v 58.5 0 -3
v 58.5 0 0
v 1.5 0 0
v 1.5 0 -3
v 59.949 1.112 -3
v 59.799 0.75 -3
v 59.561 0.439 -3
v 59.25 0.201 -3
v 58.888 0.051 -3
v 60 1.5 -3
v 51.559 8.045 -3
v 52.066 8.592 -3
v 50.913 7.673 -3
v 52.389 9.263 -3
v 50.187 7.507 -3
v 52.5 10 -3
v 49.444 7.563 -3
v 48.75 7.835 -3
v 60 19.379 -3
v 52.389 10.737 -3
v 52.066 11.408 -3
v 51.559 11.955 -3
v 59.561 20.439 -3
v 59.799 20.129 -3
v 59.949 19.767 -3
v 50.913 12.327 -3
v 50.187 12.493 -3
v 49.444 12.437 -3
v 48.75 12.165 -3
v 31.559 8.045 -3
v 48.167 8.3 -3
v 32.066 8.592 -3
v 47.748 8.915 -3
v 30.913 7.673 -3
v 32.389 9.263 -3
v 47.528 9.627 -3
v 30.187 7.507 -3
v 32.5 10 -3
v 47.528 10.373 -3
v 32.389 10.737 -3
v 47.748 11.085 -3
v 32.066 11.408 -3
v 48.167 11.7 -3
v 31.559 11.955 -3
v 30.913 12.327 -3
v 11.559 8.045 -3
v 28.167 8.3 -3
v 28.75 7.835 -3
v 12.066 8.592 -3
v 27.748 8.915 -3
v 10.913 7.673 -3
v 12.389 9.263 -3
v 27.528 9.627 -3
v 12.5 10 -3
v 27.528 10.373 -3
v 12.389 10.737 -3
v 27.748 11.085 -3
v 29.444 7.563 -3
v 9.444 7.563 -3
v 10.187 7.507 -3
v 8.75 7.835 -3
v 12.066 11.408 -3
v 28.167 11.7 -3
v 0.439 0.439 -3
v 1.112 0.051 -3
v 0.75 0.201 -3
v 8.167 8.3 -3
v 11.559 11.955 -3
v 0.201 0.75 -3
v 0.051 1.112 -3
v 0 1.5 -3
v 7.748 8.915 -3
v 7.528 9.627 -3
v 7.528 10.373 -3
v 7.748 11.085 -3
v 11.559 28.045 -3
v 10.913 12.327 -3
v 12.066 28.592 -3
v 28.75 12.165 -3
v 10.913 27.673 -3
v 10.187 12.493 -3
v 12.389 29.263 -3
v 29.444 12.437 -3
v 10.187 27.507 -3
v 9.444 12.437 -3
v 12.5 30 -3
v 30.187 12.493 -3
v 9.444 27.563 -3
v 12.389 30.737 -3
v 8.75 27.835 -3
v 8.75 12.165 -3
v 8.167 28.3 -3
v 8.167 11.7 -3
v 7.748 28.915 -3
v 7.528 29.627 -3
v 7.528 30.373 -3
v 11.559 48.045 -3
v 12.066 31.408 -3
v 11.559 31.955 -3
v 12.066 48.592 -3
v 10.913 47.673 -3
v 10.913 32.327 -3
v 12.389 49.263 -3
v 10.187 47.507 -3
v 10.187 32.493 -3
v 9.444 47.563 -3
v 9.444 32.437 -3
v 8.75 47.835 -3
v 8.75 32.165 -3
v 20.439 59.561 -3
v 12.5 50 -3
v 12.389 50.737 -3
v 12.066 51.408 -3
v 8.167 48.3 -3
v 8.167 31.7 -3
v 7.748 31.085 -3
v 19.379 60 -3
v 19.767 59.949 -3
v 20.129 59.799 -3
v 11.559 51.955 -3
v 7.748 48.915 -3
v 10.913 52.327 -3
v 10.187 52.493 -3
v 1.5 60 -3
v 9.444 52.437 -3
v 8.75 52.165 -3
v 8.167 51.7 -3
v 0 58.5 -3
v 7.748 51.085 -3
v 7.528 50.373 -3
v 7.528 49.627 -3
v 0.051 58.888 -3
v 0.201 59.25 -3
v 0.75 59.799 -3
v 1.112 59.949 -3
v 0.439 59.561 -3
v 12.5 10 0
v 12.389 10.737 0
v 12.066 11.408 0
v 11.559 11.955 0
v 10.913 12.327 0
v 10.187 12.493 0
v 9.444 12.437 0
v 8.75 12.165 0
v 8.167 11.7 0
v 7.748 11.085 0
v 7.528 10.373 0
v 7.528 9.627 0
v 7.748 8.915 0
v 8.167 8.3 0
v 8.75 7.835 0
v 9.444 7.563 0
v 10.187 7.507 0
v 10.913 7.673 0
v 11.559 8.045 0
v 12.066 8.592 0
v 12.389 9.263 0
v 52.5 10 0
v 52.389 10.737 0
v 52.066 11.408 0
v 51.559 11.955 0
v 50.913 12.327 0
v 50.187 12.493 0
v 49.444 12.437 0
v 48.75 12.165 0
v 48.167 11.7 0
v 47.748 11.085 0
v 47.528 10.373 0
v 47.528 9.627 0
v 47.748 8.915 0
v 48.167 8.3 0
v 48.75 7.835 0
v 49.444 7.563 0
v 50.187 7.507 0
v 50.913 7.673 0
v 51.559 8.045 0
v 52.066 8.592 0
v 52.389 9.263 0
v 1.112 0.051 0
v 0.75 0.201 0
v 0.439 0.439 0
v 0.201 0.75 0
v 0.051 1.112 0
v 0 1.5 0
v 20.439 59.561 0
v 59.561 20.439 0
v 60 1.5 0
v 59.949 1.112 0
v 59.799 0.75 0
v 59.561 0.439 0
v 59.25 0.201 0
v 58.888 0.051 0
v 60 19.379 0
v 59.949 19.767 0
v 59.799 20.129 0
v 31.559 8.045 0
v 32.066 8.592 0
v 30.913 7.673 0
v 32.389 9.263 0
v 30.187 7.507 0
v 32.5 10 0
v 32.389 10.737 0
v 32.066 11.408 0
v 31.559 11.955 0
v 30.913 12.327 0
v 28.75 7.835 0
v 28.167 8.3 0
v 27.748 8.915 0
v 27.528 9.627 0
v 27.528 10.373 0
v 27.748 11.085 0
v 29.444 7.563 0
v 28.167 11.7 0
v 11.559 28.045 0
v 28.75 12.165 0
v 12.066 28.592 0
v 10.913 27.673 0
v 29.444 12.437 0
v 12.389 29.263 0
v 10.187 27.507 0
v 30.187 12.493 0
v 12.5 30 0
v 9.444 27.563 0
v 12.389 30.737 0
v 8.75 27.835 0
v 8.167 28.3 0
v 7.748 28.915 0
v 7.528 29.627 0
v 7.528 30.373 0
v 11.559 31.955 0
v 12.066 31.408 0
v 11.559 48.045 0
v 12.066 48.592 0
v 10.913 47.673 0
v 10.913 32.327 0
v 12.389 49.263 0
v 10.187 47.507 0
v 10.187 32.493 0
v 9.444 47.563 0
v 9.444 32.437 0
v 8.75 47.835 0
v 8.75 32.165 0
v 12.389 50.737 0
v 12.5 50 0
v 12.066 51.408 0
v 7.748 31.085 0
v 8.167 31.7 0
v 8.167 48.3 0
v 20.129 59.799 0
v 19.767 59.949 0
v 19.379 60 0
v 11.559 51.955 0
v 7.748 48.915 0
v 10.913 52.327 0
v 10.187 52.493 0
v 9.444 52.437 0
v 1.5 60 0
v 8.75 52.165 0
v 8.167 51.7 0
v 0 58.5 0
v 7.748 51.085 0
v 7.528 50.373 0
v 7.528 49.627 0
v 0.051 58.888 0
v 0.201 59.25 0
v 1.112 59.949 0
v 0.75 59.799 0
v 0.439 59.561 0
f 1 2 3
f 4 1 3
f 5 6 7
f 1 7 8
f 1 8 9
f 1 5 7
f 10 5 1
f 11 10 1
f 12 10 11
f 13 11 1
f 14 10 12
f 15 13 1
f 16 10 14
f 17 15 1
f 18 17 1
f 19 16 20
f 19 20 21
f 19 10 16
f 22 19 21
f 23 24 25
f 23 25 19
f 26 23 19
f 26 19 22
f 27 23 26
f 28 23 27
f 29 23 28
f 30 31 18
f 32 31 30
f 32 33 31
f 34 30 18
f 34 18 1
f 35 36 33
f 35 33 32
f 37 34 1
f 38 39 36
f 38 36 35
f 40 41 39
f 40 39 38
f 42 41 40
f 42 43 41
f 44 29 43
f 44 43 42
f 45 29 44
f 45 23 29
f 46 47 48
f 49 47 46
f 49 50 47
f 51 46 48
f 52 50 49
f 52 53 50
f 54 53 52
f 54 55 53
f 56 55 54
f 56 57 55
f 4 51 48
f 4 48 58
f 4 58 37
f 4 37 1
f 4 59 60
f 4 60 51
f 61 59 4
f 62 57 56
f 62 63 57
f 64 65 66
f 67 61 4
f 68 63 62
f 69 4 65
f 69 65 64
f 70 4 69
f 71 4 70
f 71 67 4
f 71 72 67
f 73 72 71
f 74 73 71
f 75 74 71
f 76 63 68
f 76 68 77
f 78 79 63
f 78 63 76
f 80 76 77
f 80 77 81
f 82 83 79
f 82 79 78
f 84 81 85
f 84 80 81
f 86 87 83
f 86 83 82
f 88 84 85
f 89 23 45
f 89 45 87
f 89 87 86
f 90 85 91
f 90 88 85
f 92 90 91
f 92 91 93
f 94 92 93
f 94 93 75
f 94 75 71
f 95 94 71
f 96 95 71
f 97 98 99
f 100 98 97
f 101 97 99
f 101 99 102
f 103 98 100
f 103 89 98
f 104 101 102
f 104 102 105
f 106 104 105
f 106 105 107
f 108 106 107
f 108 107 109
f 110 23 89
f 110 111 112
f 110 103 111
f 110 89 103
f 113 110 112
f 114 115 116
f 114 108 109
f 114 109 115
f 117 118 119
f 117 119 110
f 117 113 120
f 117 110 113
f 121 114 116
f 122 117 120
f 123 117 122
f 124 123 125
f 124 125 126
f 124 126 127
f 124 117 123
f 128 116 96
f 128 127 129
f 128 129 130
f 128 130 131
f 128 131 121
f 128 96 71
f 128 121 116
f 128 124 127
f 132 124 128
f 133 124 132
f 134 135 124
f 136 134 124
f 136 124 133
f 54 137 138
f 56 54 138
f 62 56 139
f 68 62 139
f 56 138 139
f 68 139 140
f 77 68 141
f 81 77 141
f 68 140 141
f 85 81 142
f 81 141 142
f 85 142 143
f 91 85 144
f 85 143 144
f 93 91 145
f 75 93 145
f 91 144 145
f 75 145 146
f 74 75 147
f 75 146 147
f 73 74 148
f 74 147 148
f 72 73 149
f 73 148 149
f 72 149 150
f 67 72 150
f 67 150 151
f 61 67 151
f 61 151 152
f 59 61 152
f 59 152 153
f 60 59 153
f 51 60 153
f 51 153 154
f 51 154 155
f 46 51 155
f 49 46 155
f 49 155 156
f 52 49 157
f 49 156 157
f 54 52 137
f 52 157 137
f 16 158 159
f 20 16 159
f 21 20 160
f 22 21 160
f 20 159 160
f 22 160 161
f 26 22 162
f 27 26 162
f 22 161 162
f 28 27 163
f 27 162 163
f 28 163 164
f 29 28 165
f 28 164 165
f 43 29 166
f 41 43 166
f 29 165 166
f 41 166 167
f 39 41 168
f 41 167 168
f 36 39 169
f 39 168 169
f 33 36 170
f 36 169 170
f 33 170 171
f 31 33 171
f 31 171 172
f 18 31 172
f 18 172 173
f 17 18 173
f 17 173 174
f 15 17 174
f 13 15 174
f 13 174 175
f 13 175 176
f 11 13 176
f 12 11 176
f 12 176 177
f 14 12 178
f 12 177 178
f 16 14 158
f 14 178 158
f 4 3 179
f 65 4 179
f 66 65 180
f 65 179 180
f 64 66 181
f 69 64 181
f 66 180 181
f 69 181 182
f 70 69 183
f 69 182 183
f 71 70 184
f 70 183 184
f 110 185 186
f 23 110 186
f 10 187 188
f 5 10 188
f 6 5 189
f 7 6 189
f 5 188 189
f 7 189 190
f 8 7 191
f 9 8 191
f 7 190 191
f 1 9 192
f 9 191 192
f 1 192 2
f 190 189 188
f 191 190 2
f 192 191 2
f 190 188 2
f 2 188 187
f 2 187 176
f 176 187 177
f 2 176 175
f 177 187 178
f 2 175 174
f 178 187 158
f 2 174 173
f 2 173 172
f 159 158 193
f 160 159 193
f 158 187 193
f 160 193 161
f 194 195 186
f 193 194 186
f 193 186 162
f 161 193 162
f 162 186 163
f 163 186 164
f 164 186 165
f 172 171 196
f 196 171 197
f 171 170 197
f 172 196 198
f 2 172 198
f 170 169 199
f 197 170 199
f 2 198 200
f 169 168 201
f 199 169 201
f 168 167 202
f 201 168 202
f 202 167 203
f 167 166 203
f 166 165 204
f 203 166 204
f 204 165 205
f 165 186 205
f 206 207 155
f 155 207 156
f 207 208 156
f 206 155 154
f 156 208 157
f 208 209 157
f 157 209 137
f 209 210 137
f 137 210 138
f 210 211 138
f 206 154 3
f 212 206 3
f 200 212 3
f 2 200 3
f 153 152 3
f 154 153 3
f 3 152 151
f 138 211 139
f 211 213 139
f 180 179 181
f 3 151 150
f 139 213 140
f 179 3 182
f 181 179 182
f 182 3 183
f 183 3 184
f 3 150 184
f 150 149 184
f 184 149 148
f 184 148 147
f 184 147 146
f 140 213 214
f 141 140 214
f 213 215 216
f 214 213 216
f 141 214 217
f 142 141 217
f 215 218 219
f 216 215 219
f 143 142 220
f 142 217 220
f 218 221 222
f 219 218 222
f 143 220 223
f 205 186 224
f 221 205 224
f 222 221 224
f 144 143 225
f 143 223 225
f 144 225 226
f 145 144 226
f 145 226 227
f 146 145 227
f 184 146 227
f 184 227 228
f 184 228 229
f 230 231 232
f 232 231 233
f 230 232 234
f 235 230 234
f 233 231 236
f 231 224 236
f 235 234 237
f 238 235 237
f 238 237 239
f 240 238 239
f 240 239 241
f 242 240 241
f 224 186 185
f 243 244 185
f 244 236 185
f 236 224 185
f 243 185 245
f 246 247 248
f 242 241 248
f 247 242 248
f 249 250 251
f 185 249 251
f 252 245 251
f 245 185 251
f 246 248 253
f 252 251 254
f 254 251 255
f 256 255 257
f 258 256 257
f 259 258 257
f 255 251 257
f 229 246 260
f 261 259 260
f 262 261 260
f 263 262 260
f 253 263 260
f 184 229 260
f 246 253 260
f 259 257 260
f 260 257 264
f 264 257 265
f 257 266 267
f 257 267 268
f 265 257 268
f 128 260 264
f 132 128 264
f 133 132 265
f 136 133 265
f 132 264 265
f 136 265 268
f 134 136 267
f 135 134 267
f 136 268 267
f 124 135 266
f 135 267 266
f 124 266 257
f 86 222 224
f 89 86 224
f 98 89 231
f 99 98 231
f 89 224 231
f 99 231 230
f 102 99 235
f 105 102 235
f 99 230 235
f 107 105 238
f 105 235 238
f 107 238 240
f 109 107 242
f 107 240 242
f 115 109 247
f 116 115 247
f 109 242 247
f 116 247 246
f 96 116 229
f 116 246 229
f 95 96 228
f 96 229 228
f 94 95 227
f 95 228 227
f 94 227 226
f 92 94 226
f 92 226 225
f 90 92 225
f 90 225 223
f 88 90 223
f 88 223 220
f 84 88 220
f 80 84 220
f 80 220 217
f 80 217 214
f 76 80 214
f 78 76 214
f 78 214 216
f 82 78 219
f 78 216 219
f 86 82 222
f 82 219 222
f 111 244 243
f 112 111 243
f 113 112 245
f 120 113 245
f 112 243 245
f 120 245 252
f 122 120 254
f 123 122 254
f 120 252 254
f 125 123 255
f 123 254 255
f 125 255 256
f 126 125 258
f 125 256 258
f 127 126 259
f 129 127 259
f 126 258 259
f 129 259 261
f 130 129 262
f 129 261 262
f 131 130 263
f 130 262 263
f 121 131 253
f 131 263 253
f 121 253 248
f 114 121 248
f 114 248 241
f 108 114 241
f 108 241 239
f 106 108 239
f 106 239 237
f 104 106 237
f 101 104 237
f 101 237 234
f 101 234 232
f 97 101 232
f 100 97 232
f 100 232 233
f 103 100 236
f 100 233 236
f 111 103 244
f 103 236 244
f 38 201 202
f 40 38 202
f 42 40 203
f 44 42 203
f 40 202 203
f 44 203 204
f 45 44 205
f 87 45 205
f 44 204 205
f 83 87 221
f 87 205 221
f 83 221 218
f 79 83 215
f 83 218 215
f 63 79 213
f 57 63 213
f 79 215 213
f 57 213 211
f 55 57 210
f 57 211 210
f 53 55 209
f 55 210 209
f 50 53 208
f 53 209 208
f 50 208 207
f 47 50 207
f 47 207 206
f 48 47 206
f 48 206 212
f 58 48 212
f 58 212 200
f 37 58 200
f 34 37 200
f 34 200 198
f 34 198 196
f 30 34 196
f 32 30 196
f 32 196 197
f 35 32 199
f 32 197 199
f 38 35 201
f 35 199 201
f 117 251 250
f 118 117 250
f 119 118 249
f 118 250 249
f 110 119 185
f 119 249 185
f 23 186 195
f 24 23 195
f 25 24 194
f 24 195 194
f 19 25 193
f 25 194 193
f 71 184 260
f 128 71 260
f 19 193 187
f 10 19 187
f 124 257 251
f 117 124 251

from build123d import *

# Parameters (mm, degrees)
BOSS_EXTRUDE1_DEPTH = 3
SKETCH2_R           = 2.5
CUT_EXTRUDE1_DEPTH  = 3


with BuildPart() as part:
    # Sketch1 → Boss-Extrude1 (new body)
    with BuildSketch(Plane.XY):
        with BuildLine():
            Line((1.5, 60), (19.378679656, 60))
            ThreePointArc((19.378679656, 60), (19.952704805, 59.885819299), (20.439339828, 59.560660172))
            Line((20.439339828, 59.560660172), (59.560660172, 20.439339828))
            ThreePointArc((59.560660172, 20.439339828), (59.885819299, 19.952704805), (60, 19.378679656))
            Line((60, 19.378679656), (60, 1.5))
            ThreePointArc((60, 1.5), (59.560660172, 0.439339828), (58.5, 0))
            Line((58.5, 0), (1.5, 0))
            ThreePointArc((1.5, 0), (0.439339828, 0.439339828), (0, 1.5))
            Line((0, 1.5), (0, 58.5))
            ThreePointArc((0, 58.5), (0.439339828, 59.560660172), (1.5, 60))
        make_face()
    extrude(amount=-BOSS_EXTRUDE1_DEPTH)

    # Sketch2 → Cut-Extrude1 (cut)
    with BuildSketch(Plane.XY):
        with Locations((10, 10)):
            Circle(SKETCH2_R)
        with Locations((30, 10)):
            Circle(SKETCH2_R)
        with Locations((50, 10)):
            Circle(SKETCH2_R)
        with Locations((10, 30)):
            Circle(SKETCH2_R)
        with Locations((10, 50)):
            Circle(SKETCH2_R)
    extrude(amount=-CUT_EXTRUDE1_DEPTH, mode=Mode.SUBTRACT)


solid = part.part
